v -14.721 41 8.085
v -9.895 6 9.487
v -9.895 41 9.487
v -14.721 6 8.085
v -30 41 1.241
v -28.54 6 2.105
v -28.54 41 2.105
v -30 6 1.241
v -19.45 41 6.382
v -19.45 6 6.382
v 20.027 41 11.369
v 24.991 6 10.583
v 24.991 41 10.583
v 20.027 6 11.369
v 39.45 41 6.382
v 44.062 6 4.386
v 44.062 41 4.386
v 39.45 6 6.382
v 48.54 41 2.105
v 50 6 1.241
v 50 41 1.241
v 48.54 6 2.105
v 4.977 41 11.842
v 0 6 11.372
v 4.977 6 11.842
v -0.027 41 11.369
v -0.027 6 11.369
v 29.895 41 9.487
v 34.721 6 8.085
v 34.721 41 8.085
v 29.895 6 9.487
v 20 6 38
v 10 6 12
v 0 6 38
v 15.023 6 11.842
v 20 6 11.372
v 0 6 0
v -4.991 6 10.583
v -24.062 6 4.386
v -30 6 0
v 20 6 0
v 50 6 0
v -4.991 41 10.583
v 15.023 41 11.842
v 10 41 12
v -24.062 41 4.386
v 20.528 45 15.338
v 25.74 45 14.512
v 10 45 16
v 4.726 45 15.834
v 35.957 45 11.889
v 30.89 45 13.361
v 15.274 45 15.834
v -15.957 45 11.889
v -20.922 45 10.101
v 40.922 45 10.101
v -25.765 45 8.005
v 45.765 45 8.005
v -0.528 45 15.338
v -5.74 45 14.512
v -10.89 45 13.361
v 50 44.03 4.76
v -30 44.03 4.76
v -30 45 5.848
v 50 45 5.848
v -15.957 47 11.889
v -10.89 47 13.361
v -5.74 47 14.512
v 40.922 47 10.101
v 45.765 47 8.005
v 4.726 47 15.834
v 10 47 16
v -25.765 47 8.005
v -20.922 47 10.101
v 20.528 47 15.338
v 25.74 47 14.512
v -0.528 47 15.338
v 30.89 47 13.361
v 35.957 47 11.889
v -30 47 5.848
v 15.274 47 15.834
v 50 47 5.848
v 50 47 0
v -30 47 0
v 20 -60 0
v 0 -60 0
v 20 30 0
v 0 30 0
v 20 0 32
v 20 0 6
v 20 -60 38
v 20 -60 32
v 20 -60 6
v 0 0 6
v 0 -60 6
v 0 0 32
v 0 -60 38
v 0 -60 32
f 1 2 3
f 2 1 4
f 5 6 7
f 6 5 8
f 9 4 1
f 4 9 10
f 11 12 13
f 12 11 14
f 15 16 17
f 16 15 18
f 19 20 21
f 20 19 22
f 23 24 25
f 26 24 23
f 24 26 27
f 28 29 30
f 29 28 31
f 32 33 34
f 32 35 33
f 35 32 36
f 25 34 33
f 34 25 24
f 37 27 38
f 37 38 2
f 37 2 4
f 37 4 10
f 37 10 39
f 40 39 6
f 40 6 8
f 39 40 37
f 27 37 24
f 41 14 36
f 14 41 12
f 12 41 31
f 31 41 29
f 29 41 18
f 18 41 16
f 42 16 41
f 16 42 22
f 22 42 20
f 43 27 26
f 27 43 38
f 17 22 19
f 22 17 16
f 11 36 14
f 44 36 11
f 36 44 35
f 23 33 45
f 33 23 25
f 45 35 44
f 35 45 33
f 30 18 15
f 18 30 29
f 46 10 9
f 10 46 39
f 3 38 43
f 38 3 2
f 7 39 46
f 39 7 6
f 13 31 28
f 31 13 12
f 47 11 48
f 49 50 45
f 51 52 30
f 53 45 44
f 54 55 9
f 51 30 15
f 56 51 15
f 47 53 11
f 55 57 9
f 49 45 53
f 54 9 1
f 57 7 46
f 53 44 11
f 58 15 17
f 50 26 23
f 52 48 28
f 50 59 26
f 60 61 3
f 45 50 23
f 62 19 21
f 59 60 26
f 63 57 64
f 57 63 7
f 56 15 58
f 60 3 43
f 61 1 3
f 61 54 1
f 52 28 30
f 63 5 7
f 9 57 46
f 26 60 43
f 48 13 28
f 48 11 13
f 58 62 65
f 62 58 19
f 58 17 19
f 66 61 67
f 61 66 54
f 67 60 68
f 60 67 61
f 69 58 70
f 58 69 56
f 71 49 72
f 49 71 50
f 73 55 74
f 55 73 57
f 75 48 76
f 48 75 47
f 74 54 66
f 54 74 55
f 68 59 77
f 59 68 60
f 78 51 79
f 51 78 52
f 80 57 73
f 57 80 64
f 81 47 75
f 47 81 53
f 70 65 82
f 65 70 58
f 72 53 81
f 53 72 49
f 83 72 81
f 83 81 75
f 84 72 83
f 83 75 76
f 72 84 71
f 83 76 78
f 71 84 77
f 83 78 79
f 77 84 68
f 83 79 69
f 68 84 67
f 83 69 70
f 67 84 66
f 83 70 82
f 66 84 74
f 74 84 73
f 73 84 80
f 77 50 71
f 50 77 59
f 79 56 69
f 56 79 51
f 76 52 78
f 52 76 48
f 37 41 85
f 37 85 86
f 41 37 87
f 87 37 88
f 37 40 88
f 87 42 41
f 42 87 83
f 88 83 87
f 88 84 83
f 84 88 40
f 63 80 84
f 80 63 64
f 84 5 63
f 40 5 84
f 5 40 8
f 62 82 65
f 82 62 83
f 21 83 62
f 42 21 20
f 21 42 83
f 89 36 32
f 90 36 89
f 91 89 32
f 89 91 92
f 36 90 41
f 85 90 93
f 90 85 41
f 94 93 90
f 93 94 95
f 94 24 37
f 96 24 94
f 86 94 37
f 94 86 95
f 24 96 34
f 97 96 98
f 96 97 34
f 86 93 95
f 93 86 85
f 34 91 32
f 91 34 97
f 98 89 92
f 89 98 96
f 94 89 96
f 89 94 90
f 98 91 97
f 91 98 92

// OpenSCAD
$fn=100;

translate([0, -60, 0])
{
    cube([20, 90, 6]);
}

translate([0, -60, 32])
{
    cube([20, 60, 6]);
}

cube([20, 6, 38]);

module ucho()
{
    translate([10, 50, -68])
    {
        rotate([90, 0, 0])
        {
            cylinder(35, 80, 80);
        }
    }

    translate([10, 54, -68])
    {
        rotate([90, 0, 0])
        {
            cylinder(4, 84, 80);
        }
    }

    translate([10, 56, -68])
    {
        rotate([90, 0, 0])
        {
            cylinder(2, 84, 84);
        }
    }
}

module uchoq()
{
    difference()
    {
        ucho();
        
        translate([-100, 0, -200])
        {
            cube([200, 100, 200]);
        }
    }
}

difference()
{
    translate([0, -9, 0])
    {
        uchoq();
    }
    
    translate([-80, 0, -1])
    {
        cube([50, 100, 50]);
    }
    
    translate([50, 0, -1])
    {
        cube([50, 100, 50]);
    }
}
